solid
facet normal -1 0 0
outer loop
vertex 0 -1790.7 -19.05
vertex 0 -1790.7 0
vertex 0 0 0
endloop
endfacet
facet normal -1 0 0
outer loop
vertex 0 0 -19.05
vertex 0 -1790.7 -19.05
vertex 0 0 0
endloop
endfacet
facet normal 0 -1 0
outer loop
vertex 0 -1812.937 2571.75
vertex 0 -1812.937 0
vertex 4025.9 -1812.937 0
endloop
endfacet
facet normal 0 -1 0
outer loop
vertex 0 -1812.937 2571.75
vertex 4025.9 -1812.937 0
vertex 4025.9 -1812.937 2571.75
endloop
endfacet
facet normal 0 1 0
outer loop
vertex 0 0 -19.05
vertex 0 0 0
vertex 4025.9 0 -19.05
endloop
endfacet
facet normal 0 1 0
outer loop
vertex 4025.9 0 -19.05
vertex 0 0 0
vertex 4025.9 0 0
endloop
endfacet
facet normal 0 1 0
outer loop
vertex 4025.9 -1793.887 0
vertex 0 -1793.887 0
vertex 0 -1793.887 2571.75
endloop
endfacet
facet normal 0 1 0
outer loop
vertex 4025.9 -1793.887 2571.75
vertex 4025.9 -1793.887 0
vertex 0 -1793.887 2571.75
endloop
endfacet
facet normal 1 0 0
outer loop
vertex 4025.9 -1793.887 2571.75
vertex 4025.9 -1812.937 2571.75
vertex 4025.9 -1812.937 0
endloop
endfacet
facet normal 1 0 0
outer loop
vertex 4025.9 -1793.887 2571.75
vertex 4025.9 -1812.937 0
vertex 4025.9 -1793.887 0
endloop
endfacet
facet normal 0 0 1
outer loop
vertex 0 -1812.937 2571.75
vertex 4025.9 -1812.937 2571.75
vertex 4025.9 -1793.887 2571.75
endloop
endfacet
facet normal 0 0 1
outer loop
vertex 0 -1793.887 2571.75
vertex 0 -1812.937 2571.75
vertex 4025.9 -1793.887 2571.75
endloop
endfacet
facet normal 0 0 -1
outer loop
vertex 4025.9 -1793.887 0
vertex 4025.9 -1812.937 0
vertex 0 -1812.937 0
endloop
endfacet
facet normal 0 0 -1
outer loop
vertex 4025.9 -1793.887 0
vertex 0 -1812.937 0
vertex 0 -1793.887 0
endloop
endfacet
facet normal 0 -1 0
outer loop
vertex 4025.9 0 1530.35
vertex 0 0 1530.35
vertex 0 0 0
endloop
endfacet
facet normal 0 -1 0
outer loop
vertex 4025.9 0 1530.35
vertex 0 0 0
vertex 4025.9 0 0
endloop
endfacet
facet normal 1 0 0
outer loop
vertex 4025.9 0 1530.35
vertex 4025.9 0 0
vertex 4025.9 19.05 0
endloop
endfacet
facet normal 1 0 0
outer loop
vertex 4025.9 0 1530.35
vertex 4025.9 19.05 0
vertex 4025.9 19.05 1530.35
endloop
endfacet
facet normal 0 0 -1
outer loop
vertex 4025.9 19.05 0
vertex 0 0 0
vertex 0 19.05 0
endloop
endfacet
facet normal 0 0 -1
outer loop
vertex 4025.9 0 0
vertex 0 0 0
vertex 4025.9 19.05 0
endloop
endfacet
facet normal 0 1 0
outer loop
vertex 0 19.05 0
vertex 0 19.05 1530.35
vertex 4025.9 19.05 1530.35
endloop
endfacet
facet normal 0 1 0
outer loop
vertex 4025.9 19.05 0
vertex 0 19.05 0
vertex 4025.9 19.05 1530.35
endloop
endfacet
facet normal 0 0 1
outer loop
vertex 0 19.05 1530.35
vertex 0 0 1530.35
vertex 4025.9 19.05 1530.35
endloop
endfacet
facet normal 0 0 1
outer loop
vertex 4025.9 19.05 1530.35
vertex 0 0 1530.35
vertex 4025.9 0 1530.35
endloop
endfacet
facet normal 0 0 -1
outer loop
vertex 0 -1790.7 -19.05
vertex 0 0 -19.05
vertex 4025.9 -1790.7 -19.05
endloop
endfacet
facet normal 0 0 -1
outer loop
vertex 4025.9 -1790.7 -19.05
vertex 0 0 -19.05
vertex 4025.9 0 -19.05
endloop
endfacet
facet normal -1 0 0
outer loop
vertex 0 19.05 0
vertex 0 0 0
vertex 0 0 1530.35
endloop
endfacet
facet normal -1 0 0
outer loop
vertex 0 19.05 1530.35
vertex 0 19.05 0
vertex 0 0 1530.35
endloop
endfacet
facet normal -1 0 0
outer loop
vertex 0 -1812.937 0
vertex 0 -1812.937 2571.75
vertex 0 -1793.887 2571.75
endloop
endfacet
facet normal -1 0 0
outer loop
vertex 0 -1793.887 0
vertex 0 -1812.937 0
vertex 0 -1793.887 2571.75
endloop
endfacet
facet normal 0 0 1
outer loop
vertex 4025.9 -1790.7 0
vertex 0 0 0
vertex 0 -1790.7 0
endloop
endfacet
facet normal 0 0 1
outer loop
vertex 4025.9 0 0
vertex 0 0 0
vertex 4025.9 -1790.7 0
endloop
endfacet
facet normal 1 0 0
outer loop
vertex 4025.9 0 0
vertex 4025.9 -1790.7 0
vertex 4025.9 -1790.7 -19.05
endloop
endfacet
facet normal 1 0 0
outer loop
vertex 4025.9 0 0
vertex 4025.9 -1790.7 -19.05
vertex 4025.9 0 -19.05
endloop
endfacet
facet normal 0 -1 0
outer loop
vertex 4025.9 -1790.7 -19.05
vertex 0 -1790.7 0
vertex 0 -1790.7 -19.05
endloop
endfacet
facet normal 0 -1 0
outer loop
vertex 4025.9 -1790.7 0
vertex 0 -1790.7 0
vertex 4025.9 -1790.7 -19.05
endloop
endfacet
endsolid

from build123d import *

# Parameters (mm, degrees)
F0_W     = 4025.9
F0_H     = 1790.7
F1_DEPTH = 19.05
F2_W     = 4025.9
F2_H     = 1530.35
F3_DEPTH = 19.05
F4_W     = 19.05
F4_H     = 2571.75
F5_DEPTH = 4025.9


# Not quite as in the source:
# - a feature names something its author has since deleted; it is built from what else it names


with BuildPart() as f1:
    # F0 (on Top) → F1 (new body)
    with BuildSketch(Plane.XY):
        with Locations((2012.95, -895.35)):
            Rectangle(F0_W, F0_H)
    extrude(amount=-F1_DEPTH)


with BuildPart() as f3:
    # F2 (on Front) → F3 (new body)
    with BuildSketch(Plane.XZ):
        with Locations((2012.95, 765.175)):
            Rectangle(F2_W, F2_H)
    extrude(amount=-F3_DEPTH)


with BuildPart() as f5:
    # F4 (on Right) → F5 (new body)
    with BuildSketch(Plane.YZ):
        with Locations((-1803.4116451339, 1285.875)):
            Rectangle(F4_W, F4_H)
    extrude(amount=F5_DEPTH)


solid = Compound([f1.part, f3.part, f5.part])
